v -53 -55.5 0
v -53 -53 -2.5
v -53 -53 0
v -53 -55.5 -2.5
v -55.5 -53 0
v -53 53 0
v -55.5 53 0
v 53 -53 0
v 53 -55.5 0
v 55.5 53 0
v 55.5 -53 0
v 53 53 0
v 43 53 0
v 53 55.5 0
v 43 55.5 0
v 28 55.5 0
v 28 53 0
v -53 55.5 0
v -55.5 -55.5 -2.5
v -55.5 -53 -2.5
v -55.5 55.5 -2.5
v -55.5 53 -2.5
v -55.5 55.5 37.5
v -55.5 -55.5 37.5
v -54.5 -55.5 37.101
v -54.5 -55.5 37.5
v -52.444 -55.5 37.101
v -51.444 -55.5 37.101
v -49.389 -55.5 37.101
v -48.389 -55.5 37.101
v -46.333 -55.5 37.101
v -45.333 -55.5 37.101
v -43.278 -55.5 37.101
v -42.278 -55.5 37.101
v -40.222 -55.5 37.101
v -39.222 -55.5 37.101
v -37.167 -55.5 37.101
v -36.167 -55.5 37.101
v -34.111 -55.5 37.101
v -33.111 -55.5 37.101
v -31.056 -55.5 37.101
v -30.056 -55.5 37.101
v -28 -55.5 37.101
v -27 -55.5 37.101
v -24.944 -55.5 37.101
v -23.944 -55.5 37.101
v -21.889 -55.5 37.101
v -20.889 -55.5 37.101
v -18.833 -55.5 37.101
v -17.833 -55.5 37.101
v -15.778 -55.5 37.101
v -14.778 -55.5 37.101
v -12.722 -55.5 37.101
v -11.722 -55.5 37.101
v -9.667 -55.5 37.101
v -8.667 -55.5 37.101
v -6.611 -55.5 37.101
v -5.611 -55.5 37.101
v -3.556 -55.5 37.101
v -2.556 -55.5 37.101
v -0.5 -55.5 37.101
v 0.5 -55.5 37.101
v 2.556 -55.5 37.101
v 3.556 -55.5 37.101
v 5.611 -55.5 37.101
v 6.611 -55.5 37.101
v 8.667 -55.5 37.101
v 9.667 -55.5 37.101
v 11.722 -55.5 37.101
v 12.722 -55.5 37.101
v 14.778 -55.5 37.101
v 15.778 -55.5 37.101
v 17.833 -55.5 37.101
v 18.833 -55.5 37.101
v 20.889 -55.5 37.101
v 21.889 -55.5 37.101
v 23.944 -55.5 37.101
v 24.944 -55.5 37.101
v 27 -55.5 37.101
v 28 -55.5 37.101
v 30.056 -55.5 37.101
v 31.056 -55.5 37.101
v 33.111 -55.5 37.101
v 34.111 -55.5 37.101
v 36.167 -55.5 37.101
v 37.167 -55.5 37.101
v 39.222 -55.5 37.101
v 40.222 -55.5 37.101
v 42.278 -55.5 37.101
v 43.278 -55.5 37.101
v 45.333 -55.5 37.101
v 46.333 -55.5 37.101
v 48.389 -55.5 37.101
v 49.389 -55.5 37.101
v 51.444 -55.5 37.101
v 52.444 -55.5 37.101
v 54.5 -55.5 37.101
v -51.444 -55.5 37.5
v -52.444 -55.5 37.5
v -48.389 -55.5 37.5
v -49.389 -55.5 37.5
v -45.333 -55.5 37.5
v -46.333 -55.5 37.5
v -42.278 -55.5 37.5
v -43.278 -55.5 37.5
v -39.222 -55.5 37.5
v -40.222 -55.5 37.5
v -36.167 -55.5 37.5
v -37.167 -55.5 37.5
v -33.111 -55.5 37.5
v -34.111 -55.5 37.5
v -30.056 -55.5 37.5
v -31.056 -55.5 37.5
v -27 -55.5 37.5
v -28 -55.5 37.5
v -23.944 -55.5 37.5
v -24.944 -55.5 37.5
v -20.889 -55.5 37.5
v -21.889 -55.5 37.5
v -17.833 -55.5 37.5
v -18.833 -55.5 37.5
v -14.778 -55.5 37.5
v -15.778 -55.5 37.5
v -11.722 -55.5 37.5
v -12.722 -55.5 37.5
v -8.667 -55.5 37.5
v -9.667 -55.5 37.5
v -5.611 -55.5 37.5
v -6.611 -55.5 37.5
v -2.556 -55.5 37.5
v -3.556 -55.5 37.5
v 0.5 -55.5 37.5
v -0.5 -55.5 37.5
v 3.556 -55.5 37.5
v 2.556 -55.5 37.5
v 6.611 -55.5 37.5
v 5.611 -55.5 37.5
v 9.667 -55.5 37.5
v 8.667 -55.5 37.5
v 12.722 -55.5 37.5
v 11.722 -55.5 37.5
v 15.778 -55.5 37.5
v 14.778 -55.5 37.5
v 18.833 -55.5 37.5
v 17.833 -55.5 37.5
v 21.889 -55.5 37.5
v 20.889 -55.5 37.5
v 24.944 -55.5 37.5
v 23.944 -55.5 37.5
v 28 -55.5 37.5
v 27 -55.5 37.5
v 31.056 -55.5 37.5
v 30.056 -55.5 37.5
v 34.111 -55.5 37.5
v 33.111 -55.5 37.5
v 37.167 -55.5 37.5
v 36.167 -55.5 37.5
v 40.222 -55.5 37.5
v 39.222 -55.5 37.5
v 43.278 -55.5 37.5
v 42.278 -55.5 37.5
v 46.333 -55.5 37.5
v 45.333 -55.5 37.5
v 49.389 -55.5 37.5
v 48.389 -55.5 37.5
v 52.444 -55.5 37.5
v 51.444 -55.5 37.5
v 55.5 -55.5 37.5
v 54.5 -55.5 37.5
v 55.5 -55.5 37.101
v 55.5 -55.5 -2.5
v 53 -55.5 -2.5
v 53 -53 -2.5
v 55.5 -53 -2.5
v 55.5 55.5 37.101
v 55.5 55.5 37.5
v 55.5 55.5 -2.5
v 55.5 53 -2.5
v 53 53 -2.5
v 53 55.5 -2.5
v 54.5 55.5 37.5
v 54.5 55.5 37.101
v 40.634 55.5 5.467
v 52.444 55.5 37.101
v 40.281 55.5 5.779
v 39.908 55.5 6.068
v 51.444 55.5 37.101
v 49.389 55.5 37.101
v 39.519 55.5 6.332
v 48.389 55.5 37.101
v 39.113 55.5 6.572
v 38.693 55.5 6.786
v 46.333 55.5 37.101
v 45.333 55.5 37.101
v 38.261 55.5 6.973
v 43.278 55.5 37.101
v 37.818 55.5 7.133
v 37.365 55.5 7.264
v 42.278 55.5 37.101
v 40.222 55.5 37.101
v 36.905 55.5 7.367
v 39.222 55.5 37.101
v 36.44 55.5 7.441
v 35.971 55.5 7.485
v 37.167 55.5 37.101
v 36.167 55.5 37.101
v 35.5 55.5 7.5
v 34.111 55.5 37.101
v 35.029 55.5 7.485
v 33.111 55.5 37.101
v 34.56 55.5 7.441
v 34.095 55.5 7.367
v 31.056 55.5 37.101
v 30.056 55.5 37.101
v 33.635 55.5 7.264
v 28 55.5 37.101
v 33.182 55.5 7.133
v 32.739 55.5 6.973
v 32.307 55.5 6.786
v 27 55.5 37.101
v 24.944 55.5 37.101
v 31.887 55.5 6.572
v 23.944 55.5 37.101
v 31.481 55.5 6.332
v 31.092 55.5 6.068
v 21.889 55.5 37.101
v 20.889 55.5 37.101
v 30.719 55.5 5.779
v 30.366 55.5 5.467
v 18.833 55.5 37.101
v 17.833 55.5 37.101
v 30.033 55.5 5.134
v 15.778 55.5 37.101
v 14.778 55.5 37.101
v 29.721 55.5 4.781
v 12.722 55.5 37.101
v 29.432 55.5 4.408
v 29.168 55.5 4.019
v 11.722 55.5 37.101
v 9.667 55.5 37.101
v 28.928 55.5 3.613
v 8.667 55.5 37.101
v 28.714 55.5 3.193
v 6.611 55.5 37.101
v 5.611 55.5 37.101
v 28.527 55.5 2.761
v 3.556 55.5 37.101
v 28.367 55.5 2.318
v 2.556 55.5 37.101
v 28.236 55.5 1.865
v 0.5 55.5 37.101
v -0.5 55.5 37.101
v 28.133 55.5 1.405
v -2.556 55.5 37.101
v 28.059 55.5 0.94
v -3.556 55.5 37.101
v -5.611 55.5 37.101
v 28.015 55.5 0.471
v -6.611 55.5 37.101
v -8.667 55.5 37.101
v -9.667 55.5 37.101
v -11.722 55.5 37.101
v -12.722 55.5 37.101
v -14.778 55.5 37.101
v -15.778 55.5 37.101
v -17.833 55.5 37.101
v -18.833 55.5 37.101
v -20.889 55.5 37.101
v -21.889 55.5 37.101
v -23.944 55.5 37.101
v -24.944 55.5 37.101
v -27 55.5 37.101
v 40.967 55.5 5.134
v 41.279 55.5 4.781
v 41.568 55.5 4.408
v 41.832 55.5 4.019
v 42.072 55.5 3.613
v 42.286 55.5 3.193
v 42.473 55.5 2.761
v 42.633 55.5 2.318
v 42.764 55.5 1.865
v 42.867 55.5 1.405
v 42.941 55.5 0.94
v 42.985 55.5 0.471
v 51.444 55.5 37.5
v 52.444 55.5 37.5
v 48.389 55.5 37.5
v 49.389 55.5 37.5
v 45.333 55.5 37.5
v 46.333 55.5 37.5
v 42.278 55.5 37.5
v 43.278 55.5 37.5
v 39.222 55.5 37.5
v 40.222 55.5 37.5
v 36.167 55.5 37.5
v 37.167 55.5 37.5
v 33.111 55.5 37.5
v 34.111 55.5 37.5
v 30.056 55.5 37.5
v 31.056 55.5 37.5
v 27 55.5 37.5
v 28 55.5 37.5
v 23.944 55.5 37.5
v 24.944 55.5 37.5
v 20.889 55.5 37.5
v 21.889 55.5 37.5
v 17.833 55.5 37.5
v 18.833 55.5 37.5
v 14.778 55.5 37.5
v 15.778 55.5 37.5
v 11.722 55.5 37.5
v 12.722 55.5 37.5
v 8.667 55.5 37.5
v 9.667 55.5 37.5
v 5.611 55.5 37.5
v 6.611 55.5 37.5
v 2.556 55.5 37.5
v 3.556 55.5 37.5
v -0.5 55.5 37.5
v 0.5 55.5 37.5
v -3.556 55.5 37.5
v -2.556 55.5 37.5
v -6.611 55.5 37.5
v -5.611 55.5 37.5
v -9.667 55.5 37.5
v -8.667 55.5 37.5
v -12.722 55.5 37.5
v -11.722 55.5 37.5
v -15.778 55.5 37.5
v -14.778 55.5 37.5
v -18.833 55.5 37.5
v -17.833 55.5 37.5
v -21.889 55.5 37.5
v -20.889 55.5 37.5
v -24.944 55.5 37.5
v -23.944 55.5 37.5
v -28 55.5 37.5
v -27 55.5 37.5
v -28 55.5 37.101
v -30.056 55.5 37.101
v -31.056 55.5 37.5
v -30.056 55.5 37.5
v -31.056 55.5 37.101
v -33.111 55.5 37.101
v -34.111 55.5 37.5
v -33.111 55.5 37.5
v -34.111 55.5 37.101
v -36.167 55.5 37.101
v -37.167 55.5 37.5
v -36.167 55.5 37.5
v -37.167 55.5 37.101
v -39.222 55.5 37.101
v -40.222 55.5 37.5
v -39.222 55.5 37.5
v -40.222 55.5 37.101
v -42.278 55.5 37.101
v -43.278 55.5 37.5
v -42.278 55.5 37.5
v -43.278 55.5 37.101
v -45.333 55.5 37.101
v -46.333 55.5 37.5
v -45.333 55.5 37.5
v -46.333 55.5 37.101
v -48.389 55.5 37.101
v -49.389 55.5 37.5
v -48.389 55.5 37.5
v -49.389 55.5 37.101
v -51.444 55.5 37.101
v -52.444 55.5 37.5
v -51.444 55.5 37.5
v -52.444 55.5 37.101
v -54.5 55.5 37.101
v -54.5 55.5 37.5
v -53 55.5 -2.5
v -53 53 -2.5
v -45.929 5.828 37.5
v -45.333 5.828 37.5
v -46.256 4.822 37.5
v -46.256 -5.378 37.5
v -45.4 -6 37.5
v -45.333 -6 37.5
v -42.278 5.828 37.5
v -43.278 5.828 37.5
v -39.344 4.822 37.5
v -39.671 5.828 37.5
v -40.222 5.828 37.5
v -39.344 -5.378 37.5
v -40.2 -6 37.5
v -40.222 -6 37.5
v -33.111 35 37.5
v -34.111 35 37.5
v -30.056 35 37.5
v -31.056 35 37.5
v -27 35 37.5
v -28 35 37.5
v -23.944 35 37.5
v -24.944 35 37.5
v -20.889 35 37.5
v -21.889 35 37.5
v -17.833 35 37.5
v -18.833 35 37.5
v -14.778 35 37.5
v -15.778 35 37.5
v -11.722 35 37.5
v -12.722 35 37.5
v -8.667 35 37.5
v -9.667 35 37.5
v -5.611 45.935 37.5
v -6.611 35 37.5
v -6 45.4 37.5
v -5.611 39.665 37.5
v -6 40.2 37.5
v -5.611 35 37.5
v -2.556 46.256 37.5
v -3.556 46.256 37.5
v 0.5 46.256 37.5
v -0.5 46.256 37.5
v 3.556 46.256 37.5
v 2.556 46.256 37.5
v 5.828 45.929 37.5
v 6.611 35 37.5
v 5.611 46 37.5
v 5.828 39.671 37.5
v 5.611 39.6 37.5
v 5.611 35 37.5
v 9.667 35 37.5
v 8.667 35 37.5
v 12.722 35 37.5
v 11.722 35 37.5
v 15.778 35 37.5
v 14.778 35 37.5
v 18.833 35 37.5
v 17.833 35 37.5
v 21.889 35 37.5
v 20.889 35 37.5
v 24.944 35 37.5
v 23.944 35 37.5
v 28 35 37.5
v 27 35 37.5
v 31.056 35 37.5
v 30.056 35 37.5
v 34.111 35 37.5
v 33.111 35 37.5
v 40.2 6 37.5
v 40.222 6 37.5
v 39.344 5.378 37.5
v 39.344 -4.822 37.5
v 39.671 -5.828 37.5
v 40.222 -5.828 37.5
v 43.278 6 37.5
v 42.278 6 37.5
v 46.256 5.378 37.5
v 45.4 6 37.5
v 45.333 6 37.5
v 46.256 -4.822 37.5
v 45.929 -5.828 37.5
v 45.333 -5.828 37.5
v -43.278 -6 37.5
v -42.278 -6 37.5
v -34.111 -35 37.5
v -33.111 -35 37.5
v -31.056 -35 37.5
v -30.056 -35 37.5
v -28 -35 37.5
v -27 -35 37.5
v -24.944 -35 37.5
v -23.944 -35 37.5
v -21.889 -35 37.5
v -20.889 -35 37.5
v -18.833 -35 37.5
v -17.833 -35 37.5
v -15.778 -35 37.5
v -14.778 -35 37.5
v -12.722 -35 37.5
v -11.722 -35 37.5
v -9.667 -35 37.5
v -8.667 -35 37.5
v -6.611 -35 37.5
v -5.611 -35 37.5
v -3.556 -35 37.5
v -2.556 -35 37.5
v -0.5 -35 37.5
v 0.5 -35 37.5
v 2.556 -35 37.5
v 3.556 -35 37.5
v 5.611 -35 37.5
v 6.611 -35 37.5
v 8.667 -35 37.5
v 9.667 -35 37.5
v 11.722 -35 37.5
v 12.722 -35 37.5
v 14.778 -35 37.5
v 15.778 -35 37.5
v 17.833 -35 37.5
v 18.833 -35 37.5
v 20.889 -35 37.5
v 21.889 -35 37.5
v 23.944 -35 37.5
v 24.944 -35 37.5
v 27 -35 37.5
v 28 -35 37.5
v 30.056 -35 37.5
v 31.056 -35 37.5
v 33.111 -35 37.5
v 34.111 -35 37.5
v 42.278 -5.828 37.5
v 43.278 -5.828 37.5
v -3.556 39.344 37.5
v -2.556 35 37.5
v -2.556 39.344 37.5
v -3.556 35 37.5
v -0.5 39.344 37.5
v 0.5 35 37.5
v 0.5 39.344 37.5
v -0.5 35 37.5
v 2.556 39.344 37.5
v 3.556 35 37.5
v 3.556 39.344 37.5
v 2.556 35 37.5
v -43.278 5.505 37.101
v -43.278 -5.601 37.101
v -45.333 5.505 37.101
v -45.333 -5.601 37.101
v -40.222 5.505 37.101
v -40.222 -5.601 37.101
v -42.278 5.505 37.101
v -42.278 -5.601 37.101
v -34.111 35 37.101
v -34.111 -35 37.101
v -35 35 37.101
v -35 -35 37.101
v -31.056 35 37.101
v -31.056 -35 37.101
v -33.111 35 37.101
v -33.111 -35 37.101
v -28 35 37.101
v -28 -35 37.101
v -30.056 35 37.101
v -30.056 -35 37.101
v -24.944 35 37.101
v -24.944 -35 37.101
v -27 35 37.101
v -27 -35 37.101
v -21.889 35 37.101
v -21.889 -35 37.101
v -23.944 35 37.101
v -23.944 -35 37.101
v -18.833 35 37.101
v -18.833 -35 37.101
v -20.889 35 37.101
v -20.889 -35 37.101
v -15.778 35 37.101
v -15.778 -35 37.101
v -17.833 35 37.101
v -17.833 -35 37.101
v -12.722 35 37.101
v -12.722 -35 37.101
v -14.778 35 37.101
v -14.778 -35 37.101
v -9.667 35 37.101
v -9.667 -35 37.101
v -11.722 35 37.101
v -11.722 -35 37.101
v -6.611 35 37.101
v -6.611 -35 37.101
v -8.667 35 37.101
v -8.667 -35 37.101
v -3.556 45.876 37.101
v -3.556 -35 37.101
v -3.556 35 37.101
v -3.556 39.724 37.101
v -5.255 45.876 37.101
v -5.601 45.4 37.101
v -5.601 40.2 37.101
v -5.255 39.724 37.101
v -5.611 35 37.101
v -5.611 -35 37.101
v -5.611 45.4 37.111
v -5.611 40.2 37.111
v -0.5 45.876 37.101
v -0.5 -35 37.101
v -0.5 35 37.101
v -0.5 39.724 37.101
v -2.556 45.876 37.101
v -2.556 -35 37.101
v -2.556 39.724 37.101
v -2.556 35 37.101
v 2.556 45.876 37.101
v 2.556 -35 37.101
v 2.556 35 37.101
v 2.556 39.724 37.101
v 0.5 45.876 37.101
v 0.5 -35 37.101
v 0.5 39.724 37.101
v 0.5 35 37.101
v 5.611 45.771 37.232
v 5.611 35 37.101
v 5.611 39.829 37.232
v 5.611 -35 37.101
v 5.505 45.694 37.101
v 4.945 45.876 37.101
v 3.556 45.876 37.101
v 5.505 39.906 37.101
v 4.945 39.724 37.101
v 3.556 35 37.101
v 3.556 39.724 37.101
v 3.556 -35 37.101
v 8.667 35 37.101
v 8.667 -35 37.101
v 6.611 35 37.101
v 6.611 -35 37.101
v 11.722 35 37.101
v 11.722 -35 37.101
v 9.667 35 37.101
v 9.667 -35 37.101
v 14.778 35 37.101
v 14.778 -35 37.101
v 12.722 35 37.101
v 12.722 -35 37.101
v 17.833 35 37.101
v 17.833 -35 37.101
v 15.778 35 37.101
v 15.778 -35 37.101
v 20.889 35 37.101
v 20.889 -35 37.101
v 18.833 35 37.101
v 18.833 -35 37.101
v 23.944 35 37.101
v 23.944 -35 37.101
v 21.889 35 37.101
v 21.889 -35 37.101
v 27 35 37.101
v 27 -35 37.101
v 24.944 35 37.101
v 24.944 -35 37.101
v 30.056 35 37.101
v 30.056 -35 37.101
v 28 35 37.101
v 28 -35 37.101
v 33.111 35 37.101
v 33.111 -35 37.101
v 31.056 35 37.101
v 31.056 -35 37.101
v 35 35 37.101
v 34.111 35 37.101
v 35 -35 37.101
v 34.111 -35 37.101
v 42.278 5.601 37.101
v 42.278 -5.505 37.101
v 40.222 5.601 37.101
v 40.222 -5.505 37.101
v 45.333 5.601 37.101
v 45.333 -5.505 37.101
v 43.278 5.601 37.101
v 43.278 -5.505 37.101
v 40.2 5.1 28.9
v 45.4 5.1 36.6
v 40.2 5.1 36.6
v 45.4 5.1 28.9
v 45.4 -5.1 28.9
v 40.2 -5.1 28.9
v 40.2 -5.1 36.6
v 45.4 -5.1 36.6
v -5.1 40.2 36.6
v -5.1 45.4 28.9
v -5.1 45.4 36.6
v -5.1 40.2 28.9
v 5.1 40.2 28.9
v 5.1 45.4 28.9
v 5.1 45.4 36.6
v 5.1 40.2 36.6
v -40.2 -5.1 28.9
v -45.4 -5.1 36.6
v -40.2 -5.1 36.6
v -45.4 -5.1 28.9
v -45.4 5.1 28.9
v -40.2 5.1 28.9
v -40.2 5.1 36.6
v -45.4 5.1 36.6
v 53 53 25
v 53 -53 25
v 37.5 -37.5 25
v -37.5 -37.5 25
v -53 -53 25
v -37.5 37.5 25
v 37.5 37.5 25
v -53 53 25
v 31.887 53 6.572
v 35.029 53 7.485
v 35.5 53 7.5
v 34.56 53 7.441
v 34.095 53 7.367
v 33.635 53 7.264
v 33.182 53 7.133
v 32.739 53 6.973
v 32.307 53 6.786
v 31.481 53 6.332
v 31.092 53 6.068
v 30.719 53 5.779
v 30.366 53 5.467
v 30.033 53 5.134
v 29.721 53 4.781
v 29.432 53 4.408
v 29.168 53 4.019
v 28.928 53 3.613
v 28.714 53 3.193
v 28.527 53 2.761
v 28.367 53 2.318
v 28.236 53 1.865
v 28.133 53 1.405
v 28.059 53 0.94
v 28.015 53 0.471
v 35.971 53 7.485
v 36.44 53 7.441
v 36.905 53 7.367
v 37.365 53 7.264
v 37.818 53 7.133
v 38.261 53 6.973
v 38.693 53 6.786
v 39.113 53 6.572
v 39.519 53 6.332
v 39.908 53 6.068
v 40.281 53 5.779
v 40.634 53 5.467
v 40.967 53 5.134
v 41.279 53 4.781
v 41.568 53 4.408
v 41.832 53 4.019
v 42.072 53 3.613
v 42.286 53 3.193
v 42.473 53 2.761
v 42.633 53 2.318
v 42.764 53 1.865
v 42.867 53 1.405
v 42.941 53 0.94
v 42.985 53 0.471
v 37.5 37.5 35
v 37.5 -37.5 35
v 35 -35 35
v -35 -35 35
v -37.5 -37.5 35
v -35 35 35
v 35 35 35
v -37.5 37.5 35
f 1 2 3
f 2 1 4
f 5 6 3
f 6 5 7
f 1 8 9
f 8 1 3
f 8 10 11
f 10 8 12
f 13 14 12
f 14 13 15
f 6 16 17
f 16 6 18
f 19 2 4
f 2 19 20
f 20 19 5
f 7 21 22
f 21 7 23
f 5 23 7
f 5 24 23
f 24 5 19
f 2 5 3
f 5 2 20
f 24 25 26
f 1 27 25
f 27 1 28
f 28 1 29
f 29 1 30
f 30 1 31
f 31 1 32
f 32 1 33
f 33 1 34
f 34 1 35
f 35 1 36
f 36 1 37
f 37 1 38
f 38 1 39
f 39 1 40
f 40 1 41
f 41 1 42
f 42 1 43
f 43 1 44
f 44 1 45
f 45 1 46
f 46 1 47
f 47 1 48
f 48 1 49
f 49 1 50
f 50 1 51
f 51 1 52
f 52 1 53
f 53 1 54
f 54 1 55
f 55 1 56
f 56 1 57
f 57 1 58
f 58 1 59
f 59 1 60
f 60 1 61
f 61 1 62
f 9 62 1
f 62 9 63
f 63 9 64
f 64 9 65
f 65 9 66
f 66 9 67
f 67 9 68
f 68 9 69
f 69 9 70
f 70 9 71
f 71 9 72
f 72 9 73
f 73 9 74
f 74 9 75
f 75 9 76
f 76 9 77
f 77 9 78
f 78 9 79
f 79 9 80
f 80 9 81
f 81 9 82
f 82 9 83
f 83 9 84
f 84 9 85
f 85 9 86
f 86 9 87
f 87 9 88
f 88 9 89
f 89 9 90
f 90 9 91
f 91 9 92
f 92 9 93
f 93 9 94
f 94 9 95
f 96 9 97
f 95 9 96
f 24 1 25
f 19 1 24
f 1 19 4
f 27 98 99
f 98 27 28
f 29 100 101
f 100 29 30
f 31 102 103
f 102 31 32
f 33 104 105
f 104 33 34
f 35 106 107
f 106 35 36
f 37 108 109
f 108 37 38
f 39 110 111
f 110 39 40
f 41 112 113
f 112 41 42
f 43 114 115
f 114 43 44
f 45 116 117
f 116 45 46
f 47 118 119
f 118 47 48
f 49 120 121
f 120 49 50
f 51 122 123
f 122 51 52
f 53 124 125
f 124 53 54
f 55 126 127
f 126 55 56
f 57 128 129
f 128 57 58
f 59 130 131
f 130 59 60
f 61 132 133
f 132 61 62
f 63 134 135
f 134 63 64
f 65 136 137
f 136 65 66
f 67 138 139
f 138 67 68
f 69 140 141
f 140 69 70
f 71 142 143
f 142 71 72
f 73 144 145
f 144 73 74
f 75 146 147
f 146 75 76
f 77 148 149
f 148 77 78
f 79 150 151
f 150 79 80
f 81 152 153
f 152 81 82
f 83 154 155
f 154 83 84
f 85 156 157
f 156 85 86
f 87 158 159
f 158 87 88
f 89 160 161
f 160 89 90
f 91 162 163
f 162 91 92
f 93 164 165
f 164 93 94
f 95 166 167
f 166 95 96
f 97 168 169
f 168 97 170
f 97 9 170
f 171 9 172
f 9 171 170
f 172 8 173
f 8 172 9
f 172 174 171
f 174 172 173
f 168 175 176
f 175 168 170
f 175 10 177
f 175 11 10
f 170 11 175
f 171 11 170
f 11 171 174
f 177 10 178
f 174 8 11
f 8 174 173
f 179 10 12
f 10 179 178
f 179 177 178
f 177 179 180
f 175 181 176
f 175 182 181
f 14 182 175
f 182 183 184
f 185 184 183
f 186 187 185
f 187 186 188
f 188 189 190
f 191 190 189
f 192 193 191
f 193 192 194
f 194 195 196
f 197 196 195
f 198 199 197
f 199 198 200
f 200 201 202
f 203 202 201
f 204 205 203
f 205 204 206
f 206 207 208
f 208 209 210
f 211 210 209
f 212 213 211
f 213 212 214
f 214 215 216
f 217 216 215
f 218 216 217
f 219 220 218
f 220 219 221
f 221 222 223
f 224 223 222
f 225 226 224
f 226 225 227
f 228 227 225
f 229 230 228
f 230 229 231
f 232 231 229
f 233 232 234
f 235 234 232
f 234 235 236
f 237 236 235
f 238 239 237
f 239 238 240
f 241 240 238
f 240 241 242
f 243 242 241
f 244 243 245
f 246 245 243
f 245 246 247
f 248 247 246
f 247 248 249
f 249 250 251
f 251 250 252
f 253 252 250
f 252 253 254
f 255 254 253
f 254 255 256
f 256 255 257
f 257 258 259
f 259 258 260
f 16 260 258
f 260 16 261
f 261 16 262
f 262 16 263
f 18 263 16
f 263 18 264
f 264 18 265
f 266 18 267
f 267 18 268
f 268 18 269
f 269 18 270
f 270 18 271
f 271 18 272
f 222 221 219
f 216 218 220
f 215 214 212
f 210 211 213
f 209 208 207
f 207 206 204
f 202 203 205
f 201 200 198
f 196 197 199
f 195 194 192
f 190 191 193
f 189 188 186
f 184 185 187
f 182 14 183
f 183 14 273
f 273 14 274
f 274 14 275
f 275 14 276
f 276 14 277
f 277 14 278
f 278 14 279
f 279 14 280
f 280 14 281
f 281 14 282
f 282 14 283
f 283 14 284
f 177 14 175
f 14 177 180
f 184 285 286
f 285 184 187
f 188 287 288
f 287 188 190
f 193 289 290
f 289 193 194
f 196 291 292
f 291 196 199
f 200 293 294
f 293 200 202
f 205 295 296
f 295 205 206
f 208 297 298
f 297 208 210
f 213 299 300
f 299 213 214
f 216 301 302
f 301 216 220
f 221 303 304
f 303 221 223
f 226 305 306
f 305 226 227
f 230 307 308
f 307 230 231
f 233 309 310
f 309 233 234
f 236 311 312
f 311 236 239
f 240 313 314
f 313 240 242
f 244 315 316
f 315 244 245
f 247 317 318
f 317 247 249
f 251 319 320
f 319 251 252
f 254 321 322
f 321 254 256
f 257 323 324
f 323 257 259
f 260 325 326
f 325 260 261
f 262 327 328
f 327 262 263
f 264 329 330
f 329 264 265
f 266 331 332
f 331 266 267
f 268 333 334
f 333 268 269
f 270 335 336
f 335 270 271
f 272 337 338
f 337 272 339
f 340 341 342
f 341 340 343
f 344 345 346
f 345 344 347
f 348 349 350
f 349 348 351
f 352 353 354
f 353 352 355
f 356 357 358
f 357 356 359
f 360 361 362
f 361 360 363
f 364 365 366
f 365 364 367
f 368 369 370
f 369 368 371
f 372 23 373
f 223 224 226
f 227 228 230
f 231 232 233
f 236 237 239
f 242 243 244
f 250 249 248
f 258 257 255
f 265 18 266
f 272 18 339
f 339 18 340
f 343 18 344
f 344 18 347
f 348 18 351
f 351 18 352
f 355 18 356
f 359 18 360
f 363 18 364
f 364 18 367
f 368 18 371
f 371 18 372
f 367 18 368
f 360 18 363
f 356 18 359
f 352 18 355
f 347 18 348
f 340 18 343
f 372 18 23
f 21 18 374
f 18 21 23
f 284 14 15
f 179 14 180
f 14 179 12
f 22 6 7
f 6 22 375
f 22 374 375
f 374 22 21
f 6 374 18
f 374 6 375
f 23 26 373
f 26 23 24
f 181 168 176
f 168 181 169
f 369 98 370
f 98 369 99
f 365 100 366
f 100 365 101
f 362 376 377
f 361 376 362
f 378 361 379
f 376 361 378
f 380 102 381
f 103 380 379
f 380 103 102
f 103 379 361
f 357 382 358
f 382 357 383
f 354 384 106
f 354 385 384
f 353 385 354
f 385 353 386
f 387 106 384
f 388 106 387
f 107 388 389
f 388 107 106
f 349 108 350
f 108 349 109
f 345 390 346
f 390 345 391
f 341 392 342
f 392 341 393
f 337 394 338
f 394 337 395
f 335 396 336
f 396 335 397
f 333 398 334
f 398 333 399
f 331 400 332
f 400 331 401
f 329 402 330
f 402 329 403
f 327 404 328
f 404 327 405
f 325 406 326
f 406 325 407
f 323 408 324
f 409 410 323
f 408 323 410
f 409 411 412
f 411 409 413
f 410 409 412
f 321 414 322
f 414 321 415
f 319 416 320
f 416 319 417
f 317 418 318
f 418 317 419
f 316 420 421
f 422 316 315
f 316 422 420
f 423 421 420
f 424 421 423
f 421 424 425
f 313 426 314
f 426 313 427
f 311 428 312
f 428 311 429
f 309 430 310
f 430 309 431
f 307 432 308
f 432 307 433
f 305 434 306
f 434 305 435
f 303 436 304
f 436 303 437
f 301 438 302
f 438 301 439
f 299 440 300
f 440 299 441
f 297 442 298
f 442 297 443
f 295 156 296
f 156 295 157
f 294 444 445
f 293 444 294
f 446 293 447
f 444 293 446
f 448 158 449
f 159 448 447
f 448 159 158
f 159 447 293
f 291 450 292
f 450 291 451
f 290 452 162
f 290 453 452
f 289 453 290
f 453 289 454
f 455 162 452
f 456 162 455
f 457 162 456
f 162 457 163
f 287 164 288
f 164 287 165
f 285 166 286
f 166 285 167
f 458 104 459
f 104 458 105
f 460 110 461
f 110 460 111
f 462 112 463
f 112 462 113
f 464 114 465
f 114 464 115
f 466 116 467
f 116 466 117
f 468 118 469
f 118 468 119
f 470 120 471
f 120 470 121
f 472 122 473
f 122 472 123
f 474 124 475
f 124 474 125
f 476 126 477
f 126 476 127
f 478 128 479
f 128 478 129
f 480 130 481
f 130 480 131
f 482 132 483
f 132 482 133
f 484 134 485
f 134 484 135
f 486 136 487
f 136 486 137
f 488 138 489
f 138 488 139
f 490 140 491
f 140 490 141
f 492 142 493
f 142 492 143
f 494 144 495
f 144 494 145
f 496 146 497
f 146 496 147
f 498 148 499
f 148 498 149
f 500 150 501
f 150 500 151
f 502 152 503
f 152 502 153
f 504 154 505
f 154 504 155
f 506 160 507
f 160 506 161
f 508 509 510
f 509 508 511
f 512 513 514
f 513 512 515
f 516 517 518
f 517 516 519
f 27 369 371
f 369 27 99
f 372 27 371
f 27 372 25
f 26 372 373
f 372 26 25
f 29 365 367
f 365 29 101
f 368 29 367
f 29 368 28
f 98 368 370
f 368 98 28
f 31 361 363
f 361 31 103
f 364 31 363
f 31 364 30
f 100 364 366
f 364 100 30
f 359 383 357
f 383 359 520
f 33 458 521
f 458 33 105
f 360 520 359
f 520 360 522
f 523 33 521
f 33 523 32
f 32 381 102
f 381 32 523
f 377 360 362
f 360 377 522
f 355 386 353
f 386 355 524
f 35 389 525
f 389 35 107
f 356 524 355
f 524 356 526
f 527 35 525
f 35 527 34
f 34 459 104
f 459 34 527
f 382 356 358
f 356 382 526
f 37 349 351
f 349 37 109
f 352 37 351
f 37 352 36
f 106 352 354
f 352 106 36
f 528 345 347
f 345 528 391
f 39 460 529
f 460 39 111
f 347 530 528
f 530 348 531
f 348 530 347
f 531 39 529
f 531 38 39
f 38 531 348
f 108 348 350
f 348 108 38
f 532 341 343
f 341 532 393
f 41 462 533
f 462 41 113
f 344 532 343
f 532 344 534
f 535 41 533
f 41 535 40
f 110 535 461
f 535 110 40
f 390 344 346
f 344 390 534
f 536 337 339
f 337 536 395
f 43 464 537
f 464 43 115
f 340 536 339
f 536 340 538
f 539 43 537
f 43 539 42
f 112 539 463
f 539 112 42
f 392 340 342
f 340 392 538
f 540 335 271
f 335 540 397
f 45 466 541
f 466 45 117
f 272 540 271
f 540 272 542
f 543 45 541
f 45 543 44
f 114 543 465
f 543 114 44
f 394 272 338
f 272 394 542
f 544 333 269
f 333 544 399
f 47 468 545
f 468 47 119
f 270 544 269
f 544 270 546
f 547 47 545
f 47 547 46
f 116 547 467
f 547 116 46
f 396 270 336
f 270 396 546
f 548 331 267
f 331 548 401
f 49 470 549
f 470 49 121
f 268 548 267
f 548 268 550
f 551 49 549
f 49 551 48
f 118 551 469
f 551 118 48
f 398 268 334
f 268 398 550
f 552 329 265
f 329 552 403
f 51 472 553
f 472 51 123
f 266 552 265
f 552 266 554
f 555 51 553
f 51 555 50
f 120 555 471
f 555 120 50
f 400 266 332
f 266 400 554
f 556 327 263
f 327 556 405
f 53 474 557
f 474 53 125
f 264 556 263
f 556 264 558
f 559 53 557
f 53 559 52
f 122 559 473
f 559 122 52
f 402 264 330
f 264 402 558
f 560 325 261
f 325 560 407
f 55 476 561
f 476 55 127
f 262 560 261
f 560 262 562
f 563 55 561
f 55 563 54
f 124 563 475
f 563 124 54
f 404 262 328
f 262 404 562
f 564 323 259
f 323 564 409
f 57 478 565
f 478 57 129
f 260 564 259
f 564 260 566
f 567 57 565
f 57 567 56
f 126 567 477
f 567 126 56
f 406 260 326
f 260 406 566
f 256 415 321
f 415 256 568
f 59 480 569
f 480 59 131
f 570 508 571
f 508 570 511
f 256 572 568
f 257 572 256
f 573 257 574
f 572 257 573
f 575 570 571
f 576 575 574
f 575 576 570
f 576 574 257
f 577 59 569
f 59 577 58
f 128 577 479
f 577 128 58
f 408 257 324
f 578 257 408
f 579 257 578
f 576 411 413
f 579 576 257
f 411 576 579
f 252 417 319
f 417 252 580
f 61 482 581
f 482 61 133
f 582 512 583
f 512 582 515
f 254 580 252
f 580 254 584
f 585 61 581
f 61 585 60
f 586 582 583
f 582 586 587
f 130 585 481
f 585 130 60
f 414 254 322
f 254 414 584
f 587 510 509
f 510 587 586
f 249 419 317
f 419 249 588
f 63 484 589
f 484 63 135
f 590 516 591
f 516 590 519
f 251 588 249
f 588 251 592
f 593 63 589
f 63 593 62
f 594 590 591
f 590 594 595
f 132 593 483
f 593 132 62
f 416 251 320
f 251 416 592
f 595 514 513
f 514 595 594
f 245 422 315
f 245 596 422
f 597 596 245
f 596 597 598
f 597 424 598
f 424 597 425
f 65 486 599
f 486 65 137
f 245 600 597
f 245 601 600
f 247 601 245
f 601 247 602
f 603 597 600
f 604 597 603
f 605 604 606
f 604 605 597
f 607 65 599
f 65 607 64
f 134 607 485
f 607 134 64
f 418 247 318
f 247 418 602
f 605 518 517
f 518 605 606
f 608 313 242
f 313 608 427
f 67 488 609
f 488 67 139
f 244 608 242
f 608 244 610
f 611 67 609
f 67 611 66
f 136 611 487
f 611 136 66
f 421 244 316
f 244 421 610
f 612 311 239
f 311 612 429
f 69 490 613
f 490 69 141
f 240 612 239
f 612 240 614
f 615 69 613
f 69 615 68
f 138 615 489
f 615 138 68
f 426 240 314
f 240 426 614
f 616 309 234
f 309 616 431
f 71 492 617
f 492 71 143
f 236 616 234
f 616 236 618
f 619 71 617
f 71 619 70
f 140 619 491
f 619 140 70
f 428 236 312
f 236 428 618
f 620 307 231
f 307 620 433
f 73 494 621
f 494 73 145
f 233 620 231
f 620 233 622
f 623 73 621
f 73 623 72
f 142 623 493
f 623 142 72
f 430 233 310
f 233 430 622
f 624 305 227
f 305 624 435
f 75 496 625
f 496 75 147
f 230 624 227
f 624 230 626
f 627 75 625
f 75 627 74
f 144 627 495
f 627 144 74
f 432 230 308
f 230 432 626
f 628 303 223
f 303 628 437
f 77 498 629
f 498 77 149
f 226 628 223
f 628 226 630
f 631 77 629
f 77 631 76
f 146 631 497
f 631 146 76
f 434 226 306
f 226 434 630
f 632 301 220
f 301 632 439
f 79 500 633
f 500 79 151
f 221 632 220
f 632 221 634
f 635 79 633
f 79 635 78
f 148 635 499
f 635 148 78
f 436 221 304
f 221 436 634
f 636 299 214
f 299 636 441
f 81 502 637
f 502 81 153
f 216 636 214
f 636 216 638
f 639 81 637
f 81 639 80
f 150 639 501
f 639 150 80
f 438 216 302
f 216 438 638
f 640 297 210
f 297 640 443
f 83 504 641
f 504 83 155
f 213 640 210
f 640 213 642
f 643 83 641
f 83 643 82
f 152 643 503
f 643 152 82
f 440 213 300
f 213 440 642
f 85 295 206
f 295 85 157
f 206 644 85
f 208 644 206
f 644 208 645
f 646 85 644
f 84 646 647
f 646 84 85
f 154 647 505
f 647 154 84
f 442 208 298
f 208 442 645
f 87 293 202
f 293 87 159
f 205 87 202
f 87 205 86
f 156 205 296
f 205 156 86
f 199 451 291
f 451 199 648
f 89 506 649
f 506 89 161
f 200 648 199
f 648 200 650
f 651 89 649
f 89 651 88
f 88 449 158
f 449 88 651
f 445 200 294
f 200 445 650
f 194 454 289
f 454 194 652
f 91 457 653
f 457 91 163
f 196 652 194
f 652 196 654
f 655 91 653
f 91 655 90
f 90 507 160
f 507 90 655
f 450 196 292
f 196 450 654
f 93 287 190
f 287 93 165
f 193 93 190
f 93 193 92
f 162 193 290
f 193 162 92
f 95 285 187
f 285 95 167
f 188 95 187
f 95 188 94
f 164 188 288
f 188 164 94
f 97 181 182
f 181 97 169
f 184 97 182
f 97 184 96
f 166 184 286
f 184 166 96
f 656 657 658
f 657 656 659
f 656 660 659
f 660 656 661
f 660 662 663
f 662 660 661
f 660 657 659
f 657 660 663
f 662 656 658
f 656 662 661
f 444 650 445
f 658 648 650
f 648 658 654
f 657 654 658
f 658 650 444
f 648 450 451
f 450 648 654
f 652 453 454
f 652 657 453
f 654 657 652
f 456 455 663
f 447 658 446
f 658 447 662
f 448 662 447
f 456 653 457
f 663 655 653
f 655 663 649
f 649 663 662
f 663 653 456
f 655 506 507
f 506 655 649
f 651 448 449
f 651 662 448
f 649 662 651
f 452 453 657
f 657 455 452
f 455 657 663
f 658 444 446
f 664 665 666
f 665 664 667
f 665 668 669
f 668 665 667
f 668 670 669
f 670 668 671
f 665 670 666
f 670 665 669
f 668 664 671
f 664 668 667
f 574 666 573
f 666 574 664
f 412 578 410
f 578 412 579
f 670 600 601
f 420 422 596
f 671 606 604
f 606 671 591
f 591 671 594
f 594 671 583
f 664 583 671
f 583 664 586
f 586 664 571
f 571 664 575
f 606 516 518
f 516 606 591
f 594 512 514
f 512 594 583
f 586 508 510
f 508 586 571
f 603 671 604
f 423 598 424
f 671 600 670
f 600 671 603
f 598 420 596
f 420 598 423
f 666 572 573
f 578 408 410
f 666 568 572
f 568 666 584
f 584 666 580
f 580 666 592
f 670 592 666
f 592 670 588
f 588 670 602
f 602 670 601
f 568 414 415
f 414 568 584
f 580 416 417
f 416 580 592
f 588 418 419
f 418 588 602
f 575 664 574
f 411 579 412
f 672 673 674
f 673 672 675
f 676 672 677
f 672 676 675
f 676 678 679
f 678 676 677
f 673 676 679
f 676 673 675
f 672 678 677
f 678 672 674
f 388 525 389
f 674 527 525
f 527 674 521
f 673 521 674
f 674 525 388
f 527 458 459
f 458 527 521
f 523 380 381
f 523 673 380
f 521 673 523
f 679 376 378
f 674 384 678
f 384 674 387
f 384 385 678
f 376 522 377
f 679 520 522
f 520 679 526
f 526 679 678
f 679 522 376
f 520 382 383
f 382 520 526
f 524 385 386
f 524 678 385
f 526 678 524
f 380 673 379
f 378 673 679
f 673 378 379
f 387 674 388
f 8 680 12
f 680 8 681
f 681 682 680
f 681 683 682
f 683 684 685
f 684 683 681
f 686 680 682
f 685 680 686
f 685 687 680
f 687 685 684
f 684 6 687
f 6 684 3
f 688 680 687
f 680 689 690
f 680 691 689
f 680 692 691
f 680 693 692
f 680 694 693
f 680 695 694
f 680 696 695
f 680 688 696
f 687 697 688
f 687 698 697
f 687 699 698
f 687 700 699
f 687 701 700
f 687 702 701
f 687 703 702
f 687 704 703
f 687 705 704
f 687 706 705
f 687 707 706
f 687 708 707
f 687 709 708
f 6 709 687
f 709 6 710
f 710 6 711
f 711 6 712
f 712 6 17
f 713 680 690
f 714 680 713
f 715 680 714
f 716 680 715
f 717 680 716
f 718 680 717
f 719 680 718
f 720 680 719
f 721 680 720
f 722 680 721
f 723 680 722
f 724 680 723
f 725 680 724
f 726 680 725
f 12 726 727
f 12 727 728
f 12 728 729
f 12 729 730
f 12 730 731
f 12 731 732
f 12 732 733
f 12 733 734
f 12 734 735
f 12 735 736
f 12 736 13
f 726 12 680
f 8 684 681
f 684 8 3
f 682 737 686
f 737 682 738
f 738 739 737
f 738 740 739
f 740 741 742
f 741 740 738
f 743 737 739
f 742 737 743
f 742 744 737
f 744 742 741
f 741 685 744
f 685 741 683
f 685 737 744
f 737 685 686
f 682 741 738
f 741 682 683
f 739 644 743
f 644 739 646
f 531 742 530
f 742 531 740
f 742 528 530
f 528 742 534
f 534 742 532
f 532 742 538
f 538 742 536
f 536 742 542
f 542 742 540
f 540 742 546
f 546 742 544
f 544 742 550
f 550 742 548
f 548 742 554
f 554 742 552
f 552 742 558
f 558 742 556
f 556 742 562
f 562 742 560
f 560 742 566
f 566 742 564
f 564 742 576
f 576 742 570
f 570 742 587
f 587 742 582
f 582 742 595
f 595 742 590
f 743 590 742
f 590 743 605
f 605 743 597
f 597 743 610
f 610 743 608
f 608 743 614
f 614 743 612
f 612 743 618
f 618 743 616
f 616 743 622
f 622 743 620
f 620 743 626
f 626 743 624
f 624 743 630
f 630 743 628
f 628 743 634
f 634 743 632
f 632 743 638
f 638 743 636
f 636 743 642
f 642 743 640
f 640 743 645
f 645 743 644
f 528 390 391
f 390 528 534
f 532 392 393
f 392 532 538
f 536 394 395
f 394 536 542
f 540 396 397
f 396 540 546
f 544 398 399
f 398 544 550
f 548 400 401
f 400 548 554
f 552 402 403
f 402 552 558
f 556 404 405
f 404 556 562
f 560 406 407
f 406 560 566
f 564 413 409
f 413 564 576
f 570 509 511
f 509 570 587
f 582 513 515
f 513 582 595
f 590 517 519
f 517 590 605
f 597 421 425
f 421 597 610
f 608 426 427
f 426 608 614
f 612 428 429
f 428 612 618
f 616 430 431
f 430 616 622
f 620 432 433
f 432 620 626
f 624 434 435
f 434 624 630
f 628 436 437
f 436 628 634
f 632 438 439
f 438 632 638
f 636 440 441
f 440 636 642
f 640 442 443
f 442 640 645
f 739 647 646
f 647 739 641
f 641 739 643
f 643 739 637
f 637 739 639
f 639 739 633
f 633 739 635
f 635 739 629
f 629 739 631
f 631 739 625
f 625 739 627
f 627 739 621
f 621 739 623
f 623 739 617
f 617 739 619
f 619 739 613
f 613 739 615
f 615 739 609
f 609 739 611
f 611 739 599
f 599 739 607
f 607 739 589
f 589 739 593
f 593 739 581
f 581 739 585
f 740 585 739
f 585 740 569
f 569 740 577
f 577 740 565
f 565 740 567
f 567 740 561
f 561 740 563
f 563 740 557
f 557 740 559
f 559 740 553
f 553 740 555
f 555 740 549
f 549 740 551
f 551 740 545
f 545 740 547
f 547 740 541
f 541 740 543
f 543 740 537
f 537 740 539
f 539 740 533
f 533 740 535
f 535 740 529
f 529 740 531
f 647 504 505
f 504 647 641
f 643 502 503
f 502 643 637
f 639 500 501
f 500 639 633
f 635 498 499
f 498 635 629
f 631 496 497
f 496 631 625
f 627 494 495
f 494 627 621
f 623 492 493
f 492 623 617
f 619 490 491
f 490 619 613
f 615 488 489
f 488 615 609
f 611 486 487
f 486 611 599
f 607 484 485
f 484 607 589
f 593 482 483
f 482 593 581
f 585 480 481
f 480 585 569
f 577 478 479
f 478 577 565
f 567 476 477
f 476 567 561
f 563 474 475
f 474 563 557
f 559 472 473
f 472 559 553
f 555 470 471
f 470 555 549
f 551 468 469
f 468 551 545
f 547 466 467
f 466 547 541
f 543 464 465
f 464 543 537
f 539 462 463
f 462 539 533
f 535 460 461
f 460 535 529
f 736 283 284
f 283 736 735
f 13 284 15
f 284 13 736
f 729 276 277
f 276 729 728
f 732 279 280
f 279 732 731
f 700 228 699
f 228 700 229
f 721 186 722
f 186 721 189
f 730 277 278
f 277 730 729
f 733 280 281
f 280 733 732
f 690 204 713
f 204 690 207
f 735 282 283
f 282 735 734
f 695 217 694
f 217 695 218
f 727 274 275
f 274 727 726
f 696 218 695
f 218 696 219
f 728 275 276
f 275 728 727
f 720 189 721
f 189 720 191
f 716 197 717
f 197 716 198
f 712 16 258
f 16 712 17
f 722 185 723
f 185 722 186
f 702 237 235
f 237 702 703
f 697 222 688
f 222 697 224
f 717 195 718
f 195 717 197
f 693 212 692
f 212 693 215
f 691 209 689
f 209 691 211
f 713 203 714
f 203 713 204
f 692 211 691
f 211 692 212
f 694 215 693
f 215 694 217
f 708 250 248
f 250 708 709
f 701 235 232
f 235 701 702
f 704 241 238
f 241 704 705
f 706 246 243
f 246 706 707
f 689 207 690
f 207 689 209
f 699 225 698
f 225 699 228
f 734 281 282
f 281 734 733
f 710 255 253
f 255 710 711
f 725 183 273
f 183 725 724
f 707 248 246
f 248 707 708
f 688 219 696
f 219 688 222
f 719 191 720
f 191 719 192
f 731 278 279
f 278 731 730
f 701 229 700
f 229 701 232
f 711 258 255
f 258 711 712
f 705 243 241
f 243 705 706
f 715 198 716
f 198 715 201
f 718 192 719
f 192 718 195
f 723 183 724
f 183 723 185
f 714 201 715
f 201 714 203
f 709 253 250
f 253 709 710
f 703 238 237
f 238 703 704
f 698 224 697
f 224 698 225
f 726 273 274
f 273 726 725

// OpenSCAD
// file: global_vars.scad
// Z axis is optical axis.

tol = 0.2;
fn=100;
wall_thickness = 2.5;

camHolder_squareSide = 42.2;
camHolder_tall = 7.5;

plateHolder_tall = 5.0;
plateHolder_R_tol = 1.0;
plateHolder_Rthick = 1.5;
plateHolder_lip = 1.5;

lightBox_side = 111.0;
light_height = 25.0;
lightBox_shellThick = wall_thickness;
lightBox_cutthrough = 70.0;
lightFilter_thick = 10.0;
lightFilter_side = lightBox_cutthrough+5.0;
lightBox_height = light_height+lightFilter_thick+lightBox_shellThick;
lightBox_cordHoleD = 15.0;
lightBox_cordHole_edgeOffset = 20.0;

mast_offset = (lightFilter_side/2)+wall_thickness;
mast_length = 10.0;
mast_width = 5.0;
mast_tall = 150;

mastGrips_thick = 5.0;
mastGrips_tall = 10.0;

piCamB2_side = 32.35;
piCamB2_tall = 2.0;
piCamB2_ledge = 5.0;
piCamB2cable_wide = 17.0;
piCamB2cable_deep = 11.0;



ribDeep = 0.4;
ribThick=1;
ribSpace=2;

piPeg_len = 10.0;
piPeg_OR = 3.0;
piPeg_IR = 1.4;
pi_len = 49.0;
pi_wid = 58.0;
piholder_thick = wall_thickness;
piholder_tall = 85.0;
piholder_fin_wide = 36.0;


module tripleMastGrip(mast_length=mast_length, mast_width=mast_width, mastGrips_thick=mastGrips_thick, arm_tall=plateHolder_tall, mastGrips_tall=mastGrips_tall, mast_offset=mast_offset, tol=tol, arms=true){
    mastGrip(mast_length, mast_width, mastGrips_thick, arm_tall, mastGrips_tall, mast_offset, tol, 0, arms);
    mastGrip(mast_length, mast_width, mastGrips_thick, arm_tall, mastGrips_tall, mast_offset, tol, 90, arms);
    mastGrip(mast_length, mast_width, mastGrips_thick, arm_tall, mastGrips_tall, mast_offset, tol, -90, arms);
}

module regularRibs(x=1, y=1, ribDeep=ribDeep, ribThick=ribThick, ribSpace=ribSpace){
    adjusted_space =(x-ribThick)/floor((x-ribThick)/(ribSpace+ribThick))-ribThick;
    for (p = [ribThick:adjusted_space+ribThick:x]){
        translate([p,0,0]){
            cube([adjusted_space, y, ribDeep]);
        }
    }
}

module XYcenteredCube(x=0,y=0,z=0){
    translate([-x/2,-y/2,0]){
        cube([x,y,z]);
    }  
}

module XYcenteredRoundedCube(x=0,y=0,z=0,r=1,fn=fn){
    translate([-x/2,-y/2,0]){
        roundedCube(x,y,z,r,fn);
    }  
}


module XYcenteredCylinder(d=0,z=0){
    translate([-d/2,-d/2,0]){
        cylinder(d=d,z);
    }  
}

module mastGrip(m_len, m_wid, g_thik, g_tall, gm_tall, off, tol, rot, arm=true){
    grip_len = m_len+(2*(g_thik));
    grip_wid = m_wid+g_thik;
    r=wall_thickness;
    rotate([0,0,rot]){
        difference(){
            union(){
                r = min(wall_thickness, mastGrips_thick);
                //main arm
                if(arm){
                    translate([-grip_len/2, 0, 0]){
                        roundedCube(grip_len, off+grip_wid, g_tall, r, fn);
                    }
                }
                //grip
                translate([-grip_len/2, off-g_thik, 0]){
                    roundedCube(grip_len, m_wid+(g_thik*2), gm_tall, r, fn);
                }
            }
            //cut
            translate([-(m_len+tol)/2, off-(tol/2),0]){
                outflangedCube(m_len+tol, m_wid+tol, gm_tall, r/1.5, fn);
            }
        }
    }
}

module tripleMastHoleToCut(m_len=mast_length, m_wid=mast_width, gm_tall=mastGrips_tall, off=mast_offset, tol=tol, yRot=180, r=wall_thickness){
    for(rot=[-90,0,90]){
        rotate([0,yRot,rot]){
            translate([-(m_len+tol)/2, off+tol, -tol/2]){
                
                outflangedCube(m_len+tol, m_wid+tol, gm_tall+tol, r=r, fn=fn);
            }
        }
    }
}

module lightBoxPegs(s=lightBox_shellThick, p=lightBox_side, up=1){
    for(rot=[0, 90, 180, 270]){
        rotate([0, 0, rot]){
            translate([-p/2, -p/2, -s*up]){
                cube([s, s, s]);
            }
        }
    }
}

module roundedCube(l, w, h, r, fn=fn){
    hull(){
        for(x=[0+r,l-r], y=[0+r,w-r], z=[0+r,h-r]){
            translate([x, y, z]){
                sphere(r=r, $fn=fn);
            }
        }
    }
}

module fourCylinderCube(l, w, h, r, fn=fn){
    hull(){
        for(x=[0+r,l-r], y=[0+r,w-r], z=0){
            translate([x, y, z]){
                cylinder(h=h, r=r, $fn=fn);
            }
        }
    }
}

module outflangedCube(l, w, h, r, fn){
    union(){
                    color("blue")
        cube([l,w,h]);
                    color("red")
        hull(){
            for(x=[0,l], y=[0,w]){
                translate([x,y,0]){
                    cylinder(h=r, r1=r, r2=0, $fn=fn);
                }
            }
        }
    }
}

module square_with_pulled_out_corners(side, h, r, fn=fn){
    _side = sqrt(2)*(side/2+r);
    difference(){
        XYcenteredCube(_side/sqrt(2),_side/sqrt(2),h);
        rotate([0,0,45]){
            for(x=[-_side/2,_side/2], y=[-_side/2,_side/2], z=0){
                translate([x, y, z]){
                    very_fine_cylinder(h=h, r=r,f=1, $fn=fn);
                }
            }
        }        
    }
}            
            

module very_fine_cylinder(h, r, f, fn=100){
    c = PI*2*r;
    n = ceil((c/fn)/f);
    a = (360/fn)/n;
    hull(){
        for(i=[0:a:(360/fn)-a]){
           rotate([0,0,i])
           cylinder(h=h, r=r, $fn=fn);  
        }
    }
}    


            
            
            
            
            
            
            
            
            
            
            
            
            
            
            
            
            
            
// main file
include <global_vars.scad>;

difference(){
    union(){
        XYcenteredCube(lightBox_side, lightBox_side, lightBox_height);
        lightBoxPegs();
    }
    //ribs
    translate([-lightBox_side/2, -lightBox_side/2, lightBox_height-ribDeep+0.001]){
        regularRibs(lightBox_side, lightBox_side, ribThick=1, ribSpace=2);
    }
    //main cutout
    XYcenteredCube(lightBox_side-2*lightBox_shellThick, lightBox_side-2*lightBox_shellThick, lightBox_height-lightBox_shellThick-lightFilter_thick);
    //filter recess
    XYcenteredCube(lightFilter_side, lightFilter_side, lightBox_height-lightBox_shellThick);
    //window
    XYcenteredCube(lightBox_cutthrough, lightBox_cutthrough, lightBox_height);
    //cord hole
    translate([lightBox_side/2-lightBox_cordHole_edgeOffset,lightBox_side/2,  0]){
        rotate([90,0,0]){
            cylinder(d=lightBox_cordHoleD, lightBox_shellThick, $fn=fn);
        }
    }
    //mast holes
    tall = lightBox_height-lightFilter_thick;
    translate([0,0,lightBox_height]){
        color("blue")
        tripleMastHoleToCut(gm_tall=lightFilter_thick-lightBox_shellThick+1, r=1, fn=5);}
}

    tall = lightBox_height-lightFilter_thick;
